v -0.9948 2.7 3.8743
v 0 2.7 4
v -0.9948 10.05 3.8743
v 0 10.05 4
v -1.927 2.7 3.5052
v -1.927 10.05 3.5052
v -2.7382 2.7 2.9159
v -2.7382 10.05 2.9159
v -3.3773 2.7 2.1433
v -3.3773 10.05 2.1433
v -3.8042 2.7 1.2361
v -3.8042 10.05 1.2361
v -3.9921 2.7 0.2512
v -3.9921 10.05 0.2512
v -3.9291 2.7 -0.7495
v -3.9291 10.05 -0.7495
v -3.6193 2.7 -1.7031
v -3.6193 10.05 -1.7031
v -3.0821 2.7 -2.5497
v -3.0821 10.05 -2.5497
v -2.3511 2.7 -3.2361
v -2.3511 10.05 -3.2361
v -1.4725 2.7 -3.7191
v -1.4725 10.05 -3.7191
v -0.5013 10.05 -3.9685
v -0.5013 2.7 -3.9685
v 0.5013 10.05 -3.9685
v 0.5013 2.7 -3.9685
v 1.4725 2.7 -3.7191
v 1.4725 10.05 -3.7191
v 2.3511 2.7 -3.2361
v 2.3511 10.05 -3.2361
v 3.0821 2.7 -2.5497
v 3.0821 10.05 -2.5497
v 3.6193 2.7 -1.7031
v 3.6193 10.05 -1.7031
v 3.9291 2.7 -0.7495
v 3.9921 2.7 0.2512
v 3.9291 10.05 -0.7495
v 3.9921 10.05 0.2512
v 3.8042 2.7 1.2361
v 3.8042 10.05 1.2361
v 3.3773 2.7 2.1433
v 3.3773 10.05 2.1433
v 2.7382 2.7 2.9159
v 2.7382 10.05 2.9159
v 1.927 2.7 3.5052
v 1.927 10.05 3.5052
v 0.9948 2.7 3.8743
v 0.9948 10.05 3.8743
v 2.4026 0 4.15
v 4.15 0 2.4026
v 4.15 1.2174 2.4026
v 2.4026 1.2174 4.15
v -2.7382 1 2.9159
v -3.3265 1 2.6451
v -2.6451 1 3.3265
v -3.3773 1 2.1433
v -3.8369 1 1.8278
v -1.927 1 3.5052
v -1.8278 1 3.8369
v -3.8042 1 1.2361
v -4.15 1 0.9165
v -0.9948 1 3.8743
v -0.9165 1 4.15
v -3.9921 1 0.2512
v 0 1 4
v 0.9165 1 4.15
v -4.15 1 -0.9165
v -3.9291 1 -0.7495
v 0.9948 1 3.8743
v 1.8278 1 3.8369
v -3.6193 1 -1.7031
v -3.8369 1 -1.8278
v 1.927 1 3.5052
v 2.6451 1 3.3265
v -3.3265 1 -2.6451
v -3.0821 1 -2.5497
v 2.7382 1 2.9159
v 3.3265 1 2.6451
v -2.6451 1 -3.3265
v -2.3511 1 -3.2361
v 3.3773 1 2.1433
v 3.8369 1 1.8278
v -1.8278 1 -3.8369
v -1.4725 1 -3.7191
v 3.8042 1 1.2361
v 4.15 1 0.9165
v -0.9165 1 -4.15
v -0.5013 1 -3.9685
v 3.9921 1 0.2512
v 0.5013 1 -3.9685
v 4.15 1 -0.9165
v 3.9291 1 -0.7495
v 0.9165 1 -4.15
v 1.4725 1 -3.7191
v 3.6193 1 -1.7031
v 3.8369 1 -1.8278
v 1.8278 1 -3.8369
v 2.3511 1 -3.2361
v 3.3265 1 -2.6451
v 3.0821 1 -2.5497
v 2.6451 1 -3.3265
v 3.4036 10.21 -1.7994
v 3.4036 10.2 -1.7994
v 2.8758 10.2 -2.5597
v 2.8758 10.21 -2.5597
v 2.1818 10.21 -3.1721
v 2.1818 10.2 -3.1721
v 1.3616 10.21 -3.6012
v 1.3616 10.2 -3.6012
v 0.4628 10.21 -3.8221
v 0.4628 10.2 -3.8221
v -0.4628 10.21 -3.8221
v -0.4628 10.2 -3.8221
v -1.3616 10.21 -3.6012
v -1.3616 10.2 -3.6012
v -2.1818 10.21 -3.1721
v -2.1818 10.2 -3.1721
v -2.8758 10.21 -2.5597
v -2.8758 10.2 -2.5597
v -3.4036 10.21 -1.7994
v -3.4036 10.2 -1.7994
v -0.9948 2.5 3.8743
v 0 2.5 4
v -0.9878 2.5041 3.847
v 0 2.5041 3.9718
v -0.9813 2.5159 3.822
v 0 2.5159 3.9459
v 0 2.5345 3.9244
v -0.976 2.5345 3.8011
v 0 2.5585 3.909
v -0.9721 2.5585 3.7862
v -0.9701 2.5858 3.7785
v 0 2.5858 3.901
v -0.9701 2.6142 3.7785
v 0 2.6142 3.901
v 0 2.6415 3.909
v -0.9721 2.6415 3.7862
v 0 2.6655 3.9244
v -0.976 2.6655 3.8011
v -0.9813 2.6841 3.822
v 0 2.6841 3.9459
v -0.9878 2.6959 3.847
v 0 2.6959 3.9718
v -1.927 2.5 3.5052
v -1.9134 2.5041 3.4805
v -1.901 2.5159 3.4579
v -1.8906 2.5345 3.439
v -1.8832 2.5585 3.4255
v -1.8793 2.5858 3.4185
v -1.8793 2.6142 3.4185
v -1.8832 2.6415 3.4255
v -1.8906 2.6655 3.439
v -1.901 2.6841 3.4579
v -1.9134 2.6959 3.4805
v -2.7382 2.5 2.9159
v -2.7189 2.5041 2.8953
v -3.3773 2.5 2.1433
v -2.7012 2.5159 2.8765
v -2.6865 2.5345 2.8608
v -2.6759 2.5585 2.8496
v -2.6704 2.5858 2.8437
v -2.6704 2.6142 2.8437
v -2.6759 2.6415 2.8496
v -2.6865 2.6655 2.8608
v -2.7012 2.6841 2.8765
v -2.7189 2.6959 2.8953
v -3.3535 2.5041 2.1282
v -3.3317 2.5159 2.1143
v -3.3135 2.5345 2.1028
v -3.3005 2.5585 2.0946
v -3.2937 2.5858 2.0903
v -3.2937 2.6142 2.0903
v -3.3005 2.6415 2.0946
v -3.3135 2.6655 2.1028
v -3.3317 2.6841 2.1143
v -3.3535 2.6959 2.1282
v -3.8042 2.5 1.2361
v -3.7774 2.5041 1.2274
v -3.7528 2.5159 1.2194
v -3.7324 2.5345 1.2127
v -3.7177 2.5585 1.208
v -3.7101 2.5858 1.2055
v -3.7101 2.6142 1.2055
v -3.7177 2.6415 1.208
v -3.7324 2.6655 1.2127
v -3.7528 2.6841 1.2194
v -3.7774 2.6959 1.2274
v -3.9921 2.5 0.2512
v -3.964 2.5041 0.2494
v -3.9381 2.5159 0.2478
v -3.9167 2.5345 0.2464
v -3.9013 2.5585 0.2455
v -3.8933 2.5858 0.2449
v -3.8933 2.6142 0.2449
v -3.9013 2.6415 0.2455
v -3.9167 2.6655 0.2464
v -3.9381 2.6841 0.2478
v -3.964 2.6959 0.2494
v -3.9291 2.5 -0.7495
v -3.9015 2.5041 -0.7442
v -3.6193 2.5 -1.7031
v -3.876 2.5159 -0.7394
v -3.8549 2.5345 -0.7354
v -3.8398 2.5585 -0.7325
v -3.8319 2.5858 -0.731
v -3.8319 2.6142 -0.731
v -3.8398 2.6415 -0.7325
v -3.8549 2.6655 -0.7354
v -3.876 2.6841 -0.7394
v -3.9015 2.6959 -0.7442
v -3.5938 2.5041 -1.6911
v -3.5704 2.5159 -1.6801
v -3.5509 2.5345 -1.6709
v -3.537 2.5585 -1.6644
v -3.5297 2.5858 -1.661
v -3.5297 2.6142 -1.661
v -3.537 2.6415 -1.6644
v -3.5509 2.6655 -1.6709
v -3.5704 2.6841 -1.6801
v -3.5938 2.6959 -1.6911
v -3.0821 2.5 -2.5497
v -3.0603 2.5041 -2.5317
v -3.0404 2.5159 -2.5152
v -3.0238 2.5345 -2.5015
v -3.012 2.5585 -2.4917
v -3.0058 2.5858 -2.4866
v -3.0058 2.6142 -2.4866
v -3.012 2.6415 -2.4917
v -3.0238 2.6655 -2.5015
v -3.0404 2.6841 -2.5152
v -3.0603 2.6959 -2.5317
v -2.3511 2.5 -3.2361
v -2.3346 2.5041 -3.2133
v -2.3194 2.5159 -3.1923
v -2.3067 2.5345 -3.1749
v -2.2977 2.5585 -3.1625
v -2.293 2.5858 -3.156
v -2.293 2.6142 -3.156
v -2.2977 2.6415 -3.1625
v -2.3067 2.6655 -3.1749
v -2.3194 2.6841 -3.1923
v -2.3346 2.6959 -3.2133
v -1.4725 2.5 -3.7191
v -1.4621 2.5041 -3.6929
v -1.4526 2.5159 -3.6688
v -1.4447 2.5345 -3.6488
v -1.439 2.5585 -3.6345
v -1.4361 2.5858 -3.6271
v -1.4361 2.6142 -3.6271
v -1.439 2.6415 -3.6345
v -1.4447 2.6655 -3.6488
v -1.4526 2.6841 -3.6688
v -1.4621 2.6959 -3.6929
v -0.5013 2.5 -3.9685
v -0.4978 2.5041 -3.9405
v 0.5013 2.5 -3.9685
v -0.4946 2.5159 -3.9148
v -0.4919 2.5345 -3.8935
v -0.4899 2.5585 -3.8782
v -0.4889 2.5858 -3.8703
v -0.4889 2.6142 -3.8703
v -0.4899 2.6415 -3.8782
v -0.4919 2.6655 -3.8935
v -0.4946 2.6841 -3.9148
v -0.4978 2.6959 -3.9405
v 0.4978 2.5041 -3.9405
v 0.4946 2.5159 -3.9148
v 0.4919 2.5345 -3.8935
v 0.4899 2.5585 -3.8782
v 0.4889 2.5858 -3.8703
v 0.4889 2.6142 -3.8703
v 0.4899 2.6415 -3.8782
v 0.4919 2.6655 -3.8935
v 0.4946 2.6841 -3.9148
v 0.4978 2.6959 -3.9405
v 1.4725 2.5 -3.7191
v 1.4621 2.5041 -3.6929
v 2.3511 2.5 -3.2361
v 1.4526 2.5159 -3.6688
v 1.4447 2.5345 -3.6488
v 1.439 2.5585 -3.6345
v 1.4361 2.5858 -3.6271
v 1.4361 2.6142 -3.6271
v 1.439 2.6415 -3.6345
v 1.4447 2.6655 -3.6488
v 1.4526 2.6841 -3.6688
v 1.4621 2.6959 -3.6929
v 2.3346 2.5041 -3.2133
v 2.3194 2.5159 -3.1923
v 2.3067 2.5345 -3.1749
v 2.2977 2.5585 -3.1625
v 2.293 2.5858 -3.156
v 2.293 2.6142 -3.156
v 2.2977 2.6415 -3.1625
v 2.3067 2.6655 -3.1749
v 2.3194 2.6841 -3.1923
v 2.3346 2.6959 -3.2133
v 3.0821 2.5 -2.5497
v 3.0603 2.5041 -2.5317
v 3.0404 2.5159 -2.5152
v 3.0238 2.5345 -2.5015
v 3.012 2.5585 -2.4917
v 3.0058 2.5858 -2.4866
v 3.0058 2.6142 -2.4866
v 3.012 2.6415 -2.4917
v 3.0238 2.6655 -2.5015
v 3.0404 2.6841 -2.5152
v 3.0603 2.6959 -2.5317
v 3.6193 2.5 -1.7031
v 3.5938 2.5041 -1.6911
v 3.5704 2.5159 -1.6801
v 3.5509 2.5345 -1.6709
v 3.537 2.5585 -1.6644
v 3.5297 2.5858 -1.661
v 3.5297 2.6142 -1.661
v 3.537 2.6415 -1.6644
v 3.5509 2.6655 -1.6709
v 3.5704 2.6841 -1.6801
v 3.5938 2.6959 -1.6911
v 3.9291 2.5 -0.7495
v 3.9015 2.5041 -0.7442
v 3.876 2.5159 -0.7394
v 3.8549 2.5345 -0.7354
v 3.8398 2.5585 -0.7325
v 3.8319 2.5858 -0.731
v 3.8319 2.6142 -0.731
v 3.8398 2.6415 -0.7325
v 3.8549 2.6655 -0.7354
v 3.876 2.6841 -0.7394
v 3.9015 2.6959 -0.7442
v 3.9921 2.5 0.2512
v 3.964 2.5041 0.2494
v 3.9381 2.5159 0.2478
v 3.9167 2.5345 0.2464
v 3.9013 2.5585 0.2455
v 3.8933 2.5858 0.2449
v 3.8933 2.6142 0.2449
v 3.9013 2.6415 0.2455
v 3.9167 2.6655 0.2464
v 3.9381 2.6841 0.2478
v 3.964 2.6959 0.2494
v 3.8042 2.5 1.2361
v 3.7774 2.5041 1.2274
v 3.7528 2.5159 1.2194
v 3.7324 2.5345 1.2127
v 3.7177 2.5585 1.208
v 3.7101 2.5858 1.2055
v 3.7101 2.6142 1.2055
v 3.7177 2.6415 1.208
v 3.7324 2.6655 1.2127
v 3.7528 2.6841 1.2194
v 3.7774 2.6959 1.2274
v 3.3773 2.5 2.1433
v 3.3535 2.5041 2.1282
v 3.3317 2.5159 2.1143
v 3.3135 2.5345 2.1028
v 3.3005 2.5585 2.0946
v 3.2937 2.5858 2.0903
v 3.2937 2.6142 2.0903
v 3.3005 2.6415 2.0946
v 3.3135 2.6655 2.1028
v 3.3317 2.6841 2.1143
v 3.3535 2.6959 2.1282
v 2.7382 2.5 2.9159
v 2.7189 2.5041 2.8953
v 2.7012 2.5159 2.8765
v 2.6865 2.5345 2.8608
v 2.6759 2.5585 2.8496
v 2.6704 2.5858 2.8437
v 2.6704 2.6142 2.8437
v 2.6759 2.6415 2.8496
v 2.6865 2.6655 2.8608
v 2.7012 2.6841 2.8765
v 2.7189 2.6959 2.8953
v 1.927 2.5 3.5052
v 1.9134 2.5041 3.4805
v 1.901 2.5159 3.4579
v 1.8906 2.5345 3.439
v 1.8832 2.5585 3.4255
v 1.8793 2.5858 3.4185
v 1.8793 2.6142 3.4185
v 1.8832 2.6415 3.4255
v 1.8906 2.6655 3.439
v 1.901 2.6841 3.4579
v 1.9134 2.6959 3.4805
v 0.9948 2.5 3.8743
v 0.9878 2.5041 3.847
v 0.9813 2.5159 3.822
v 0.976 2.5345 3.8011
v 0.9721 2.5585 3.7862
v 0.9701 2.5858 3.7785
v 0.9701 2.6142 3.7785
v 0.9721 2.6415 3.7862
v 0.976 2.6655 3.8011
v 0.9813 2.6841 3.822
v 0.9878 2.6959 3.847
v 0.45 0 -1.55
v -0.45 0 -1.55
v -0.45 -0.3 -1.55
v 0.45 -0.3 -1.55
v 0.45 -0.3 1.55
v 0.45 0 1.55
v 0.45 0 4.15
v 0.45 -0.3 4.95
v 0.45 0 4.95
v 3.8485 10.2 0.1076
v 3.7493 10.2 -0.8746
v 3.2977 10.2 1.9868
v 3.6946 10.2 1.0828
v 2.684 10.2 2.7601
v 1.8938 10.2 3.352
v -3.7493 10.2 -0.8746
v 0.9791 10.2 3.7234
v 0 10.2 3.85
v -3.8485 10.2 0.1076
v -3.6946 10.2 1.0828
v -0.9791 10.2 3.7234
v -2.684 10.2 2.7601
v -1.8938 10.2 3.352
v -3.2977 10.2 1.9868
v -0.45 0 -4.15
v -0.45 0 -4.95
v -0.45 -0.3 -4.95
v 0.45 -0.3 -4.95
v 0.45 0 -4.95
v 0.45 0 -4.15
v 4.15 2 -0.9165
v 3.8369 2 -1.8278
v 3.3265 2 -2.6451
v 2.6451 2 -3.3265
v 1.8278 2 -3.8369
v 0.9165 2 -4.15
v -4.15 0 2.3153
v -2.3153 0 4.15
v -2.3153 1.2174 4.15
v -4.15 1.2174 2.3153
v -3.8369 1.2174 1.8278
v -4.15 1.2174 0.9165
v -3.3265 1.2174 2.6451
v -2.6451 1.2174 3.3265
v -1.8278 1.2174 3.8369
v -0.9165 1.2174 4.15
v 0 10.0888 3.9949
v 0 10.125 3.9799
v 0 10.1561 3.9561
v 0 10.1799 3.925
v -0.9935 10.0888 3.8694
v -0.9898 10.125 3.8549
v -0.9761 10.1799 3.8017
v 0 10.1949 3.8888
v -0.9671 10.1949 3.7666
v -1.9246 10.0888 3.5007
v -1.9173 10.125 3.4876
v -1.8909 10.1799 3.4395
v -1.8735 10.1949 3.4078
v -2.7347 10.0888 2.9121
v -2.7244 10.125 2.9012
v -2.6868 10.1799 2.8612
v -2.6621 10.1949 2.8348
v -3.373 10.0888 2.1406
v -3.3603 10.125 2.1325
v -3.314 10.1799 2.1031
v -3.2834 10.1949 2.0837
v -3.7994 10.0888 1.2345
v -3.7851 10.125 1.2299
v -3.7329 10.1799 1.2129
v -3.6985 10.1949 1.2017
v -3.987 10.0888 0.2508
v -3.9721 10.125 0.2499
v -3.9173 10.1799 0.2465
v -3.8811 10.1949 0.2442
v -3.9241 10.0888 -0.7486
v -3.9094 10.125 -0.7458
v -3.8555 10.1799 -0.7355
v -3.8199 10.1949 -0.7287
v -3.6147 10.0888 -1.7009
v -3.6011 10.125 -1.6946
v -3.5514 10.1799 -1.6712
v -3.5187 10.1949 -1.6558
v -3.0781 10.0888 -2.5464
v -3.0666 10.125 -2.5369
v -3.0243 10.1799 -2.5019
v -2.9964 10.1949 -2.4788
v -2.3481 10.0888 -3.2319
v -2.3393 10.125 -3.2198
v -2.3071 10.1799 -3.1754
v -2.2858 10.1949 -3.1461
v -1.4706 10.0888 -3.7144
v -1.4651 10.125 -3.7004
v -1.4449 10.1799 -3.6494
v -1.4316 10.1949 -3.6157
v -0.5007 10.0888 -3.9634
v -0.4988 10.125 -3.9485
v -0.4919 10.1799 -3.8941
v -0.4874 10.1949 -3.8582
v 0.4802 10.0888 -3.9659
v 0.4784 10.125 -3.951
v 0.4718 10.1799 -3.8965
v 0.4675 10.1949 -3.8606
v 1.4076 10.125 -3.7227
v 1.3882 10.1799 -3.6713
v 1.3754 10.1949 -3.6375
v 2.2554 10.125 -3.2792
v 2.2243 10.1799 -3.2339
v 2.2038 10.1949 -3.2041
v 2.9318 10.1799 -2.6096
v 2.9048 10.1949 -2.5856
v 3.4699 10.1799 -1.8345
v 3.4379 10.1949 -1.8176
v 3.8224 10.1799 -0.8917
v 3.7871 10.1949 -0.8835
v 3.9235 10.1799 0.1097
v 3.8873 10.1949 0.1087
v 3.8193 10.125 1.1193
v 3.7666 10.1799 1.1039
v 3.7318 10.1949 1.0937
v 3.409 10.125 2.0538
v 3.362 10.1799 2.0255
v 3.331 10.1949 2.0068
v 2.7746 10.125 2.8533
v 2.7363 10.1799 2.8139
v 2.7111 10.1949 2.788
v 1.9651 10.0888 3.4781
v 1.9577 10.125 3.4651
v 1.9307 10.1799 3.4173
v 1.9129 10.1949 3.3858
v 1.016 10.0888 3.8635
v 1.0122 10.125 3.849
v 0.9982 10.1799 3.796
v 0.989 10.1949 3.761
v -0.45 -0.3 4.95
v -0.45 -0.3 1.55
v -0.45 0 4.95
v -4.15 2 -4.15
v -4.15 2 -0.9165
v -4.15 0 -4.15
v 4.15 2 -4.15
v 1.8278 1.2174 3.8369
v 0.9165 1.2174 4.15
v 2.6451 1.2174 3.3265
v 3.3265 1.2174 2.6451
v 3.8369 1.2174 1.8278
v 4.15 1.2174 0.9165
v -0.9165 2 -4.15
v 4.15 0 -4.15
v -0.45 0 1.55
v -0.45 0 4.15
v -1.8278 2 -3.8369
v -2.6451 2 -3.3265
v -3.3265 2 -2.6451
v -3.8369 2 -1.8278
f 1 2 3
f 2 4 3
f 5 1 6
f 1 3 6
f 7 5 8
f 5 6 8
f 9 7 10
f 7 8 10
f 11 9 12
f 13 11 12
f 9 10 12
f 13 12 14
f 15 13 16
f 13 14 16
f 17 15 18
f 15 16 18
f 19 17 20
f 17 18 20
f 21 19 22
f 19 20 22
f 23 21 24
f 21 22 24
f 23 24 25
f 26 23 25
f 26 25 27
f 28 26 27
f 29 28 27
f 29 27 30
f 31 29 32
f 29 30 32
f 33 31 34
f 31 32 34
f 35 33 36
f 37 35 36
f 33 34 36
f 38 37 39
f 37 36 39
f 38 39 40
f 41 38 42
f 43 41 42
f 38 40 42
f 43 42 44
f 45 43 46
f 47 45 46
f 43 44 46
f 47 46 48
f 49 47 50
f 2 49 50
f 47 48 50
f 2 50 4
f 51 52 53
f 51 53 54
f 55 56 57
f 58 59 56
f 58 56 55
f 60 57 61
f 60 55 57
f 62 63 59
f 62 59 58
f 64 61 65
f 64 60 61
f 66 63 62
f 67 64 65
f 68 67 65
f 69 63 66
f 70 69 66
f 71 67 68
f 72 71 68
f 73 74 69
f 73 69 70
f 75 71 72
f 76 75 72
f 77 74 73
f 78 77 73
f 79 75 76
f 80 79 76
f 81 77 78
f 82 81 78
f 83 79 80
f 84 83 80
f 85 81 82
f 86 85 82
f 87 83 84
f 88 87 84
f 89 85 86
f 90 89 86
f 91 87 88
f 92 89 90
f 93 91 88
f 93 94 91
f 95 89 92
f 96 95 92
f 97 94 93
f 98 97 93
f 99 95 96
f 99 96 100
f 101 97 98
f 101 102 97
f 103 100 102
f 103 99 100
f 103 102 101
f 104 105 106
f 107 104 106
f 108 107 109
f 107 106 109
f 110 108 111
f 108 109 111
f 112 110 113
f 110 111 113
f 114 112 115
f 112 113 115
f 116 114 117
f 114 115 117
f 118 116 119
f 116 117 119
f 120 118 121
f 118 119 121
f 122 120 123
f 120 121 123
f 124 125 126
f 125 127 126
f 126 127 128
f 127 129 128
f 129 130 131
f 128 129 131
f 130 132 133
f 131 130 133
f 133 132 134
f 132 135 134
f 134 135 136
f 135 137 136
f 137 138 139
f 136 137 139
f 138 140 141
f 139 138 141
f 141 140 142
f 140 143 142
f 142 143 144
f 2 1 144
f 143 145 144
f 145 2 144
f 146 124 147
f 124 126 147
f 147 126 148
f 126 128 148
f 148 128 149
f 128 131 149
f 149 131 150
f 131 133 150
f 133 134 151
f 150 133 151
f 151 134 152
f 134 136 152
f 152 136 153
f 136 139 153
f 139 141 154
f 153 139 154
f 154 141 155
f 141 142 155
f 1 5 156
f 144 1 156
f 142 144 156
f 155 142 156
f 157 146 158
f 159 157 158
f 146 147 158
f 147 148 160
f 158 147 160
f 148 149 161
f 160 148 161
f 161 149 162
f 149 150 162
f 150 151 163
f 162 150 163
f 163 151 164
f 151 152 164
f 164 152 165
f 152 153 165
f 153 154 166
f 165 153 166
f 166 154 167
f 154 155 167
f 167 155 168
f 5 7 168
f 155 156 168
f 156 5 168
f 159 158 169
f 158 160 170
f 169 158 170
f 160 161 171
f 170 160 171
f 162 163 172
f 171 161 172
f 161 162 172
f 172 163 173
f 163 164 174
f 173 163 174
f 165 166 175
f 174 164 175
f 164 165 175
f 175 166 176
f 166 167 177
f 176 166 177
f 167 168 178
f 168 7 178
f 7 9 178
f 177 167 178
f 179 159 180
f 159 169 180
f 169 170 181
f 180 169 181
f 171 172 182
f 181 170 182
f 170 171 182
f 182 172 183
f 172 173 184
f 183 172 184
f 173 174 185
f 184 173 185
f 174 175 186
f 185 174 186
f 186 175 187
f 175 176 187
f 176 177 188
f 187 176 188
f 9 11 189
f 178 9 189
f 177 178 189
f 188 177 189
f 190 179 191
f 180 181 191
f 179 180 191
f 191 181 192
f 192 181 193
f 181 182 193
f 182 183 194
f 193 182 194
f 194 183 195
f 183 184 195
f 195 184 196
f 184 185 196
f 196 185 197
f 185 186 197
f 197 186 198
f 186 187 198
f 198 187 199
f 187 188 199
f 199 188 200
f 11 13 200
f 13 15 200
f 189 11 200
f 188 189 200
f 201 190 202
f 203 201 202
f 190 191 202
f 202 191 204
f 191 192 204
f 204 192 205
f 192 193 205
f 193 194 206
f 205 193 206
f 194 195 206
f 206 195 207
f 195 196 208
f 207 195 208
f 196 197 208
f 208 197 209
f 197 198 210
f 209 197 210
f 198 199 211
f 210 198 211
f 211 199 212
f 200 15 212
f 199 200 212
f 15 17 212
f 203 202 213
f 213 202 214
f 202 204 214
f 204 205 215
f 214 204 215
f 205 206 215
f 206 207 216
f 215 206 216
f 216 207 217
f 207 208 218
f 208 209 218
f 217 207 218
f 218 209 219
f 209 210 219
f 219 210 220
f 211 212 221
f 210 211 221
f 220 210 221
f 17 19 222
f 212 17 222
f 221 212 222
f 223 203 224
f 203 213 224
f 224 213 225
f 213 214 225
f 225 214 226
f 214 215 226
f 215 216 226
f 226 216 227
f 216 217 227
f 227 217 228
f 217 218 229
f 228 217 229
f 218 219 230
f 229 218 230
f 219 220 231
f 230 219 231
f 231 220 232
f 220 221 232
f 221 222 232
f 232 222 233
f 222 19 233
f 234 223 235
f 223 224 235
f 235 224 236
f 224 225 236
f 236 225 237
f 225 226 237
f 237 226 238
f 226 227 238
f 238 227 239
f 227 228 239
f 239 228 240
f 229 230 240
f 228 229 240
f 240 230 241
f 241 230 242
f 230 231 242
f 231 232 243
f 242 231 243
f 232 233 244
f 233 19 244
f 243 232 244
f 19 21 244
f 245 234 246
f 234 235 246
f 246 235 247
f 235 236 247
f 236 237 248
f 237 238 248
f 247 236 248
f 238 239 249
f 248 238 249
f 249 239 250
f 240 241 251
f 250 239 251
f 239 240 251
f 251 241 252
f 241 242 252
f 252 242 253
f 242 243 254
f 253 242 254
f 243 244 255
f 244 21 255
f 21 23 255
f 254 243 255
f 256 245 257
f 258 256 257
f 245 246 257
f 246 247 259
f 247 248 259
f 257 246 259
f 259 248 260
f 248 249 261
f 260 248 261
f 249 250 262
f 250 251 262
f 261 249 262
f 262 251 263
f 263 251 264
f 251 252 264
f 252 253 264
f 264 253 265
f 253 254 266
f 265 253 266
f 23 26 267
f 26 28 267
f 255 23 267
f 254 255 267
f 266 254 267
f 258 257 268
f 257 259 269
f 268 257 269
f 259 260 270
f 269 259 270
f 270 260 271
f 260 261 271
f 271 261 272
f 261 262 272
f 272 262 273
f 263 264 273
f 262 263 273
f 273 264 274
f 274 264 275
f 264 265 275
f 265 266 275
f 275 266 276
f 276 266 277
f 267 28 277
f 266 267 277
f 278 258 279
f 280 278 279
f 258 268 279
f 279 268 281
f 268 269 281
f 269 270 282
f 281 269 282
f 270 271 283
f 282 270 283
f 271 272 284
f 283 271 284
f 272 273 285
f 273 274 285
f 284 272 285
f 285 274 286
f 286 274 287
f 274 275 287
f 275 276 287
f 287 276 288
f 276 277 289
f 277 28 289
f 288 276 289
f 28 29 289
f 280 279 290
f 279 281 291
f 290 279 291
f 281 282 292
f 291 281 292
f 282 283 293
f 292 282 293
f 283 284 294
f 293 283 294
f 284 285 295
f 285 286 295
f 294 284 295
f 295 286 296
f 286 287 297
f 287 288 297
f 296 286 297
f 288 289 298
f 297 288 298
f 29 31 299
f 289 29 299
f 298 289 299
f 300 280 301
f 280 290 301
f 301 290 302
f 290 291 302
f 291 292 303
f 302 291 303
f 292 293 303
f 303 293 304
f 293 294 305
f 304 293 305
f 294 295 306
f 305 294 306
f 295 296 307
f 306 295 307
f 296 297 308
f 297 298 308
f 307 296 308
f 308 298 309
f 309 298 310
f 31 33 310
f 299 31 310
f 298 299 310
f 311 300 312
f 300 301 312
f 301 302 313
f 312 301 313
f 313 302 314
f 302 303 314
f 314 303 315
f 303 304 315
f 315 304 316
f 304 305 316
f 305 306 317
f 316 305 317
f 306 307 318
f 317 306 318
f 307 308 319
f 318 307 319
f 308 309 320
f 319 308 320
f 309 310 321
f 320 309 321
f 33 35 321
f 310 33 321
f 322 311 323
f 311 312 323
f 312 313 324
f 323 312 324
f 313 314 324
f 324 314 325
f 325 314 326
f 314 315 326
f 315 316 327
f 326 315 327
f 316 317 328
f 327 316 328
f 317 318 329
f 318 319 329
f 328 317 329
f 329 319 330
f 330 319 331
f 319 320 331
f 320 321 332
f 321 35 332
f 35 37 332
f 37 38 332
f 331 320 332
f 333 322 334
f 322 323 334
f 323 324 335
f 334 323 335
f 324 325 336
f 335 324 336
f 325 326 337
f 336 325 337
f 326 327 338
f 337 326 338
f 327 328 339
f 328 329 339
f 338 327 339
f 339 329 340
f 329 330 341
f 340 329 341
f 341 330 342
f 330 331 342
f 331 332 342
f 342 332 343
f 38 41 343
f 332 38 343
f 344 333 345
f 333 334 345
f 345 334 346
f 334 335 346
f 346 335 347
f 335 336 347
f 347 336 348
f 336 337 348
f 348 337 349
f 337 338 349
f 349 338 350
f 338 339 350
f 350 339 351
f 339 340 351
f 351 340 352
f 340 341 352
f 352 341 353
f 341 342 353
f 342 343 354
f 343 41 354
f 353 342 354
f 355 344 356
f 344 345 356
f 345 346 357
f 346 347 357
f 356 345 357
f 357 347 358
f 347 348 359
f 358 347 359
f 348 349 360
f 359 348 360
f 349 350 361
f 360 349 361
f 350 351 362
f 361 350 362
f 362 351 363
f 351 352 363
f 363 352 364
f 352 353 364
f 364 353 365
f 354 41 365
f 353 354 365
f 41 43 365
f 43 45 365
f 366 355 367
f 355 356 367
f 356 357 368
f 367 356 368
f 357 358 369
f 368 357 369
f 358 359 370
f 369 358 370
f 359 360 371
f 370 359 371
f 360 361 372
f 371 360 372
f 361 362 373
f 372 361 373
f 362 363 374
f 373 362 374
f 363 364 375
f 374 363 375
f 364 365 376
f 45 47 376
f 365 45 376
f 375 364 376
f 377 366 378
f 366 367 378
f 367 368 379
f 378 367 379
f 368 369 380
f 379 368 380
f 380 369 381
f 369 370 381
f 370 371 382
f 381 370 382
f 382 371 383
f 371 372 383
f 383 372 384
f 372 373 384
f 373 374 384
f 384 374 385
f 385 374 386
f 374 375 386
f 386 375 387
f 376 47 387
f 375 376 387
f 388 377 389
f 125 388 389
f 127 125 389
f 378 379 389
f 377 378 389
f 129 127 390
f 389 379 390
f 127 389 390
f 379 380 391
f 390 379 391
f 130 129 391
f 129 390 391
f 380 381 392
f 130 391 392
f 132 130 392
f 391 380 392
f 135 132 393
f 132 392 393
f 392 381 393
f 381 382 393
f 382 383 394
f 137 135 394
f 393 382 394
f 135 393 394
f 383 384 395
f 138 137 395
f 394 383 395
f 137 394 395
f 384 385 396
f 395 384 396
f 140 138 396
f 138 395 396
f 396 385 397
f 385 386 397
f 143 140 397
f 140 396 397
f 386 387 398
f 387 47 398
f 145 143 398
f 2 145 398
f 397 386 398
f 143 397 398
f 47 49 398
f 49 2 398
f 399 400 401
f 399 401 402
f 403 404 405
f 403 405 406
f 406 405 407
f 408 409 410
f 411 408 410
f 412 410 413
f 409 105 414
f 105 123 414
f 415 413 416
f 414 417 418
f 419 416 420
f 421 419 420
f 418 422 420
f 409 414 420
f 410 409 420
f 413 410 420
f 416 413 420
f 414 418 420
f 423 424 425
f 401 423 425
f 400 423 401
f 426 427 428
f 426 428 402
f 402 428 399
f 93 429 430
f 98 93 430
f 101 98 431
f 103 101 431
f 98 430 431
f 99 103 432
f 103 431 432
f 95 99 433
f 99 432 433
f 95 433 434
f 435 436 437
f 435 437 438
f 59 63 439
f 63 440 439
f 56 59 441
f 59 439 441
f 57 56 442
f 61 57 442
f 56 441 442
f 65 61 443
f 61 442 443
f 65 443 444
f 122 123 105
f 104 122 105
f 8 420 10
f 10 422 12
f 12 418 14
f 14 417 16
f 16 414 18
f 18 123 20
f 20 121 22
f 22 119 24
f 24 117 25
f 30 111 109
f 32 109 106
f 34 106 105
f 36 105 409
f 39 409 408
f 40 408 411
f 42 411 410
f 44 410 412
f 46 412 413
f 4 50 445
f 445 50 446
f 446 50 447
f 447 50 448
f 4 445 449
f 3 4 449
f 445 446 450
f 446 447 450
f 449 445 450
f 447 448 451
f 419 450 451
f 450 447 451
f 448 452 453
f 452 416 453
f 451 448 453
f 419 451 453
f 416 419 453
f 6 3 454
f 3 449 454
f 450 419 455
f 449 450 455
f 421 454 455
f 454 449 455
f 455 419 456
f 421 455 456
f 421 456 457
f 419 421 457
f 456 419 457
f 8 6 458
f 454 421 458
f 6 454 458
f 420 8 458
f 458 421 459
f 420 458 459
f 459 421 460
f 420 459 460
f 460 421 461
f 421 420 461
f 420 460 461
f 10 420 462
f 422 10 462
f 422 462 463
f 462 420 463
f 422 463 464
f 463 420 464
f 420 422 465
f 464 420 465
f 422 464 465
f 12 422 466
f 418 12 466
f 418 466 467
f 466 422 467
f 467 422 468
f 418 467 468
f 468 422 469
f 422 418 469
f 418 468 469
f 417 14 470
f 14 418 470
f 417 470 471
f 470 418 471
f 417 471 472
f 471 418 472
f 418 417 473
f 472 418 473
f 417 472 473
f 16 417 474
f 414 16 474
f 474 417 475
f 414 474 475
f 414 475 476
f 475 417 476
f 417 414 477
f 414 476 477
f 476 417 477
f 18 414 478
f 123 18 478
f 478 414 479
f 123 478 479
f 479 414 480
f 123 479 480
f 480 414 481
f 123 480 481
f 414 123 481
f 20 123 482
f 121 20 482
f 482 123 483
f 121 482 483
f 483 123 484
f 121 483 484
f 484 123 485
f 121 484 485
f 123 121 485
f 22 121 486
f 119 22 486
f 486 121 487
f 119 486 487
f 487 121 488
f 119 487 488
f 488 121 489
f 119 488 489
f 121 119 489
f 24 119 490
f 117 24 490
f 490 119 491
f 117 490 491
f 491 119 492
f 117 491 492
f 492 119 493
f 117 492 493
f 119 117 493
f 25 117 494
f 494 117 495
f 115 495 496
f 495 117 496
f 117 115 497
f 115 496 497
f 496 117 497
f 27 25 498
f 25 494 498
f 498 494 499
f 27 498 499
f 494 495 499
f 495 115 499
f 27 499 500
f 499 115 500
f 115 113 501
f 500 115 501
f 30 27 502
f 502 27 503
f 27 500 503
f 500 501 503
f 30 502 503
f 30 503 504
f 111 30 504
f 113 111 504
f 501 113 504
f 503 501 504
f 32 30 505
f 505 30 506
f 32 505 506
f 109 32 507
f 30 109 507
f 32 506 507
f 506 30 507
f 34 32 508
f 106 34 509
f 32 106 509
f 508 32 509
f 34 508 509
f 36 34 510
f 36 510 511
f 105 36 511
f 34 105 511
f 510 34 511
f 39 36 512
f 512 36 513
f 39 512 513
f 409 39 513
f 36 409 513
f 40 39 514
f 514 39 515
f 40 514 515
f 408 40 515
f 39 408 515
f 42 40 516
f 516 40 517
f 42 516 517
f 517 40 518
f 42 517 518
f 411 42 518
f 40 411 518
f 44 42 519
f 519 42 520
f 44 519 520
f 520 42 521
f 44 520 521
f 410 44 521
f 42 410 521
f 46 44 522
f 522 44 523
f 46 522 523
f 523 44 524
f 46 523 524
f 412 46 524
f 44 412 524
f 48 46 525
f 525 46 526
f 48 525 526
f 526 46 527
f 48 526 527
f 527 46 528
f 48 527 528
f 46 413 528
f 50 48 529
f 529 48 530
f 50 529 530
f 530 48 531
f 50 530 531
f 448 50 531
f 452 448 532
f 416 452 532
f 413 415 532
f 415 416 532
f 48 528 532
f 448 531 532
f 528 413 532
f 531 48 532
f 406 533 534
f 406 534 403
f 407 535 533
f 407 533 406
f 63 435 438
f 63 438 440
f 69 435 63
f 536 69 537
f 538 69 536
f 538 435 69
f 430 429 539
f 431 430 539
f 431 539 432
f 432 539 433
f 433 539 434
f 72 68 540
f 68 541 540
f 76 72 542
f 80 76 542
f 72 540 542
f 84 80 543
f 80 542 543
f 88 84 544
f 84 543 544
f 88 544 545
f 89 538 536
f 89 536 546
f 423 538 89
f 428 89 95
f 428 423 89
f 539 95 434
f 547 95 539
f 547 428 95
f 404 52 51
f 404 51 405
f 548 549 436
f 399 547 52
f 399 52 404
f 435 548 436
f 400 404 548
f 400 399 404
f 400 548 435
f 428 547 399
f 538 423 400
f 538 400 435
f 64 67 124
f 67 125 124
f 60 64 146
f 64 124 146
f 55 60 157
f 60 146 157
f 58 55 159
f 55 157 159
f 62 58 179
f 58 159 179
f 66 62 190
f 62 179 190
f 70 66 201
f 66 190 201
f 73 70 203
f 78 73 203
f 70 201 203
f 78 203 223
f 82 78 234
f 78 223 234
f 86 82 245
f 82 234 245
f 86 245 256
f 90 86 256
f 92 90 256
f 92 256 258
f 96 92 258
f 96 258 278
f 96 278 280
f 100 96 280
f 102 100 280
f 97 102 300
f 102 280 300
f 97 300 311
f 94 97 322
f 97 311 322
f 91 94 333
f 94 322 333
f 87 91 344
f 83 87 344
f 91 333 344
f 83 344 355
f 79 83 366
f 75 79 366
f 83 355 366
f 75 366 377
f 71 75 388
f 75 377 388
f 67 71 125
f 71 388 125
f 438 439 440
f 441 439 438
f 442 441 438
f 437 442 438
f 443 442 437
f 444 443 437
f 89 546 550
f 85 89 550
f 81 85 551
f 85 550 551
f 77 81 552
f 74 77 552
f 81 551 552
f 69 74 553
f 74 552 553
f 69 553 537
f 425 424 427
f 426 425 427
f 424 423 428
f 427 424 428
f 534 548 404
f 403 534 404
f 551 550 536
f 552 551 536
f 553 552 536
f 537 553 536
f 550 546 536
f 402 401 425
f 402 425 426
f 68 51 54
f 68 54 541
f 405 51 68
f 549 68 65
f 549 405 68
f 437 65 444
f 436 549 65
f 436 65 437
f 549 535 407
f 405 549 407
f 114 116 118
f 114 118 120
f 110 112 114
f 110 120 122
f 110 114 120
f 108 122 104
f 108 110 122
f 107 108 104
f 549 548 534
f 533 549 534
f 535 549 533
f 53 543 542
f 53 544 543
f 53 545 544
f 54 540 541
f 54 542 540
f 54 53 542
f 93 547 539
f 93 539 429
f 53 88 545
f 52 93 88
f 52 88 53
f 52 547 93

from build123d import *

# Parameters (mm, degrees)
BOSS_EXTRUDE1_DEPTH = 2
SKETCH2_R           = 4.25
CUT_EXTRUDE1_DEPTH  = 1
CUT_EXTRUDE4_START  = -8.3
SKETCH8_W           = 3.410115148
SKETCH8_H           = 1.095606144
CUT_EXTRUDE4_DEPTH  = 8.3
BOSS_EXTRUDE4_DEPTH = 0.01
SKETCH9_W           = 0.9
SKETCH9_H           = 3.4
BOSS_EXTRUDE5_DEPTH = 0.3


with BuildPart() as part:
    # Sketch1 → Boss-Extrude1 (new body)
    with BuildSketch(Plane(origin=(0, 0, 0), x_dir=(1, 0, 0), z_dir=(0, 1, 0))):
        Polygon((-4.15, 4.15), (4.15, 4.15), (4.15, -2.402631579), (2.402631579, -4.15), (-2.315263158, -4.15), (-4.15, -2.315263158), align=None)
    extrude(amount=BOSS_EXTRUDE1_DEPTH)

    # Sketch2 → Cut-Extrude1 (cut)
    with BuildSketch(Plane(origin=(0, 2, 0), x_dir=(1, 0, 0), z_dir=(0, 1, 0))):
        Circle(SKETCH2_R)
    extrude(amount=-CUT_EXTRUDE1_DEPTH, mode=Mode.SUBTRACT)

    # Sketch8 → Cut-Extrude4 (cut)
    with BuildSketch(Plane.ZY.offset(4.15).offset(CUT_EXTRUDE4_START)):
        with Locations((2.621572713, 1.765165498)):
            Rectangle(SKETCH8_W, SKETCH8_H)
    extrude(amount=CUT_EXTRUDE4_DEPTH, mode=Mode.SUBTRACT)

    # Sketch5 → Revolve1 (revolve)
    with BuildSketch(Plane.XY, mode=Mode.PRIVATE) as revolve1_sk:
        with BuildLine():
            Line((0, 1), (-4, 1))
            Line((-4, 1), (-4, 2.5))
            ThreePointArc((-4, 2.5), (-3.9, 2.6), (-4, 2.7))
            Line((-4, 2.7), (-4, 10.05))
            ThreePointArc((-4, 10.05), (-3.956066017, 10.156066017), (-3.85, 10.2))
            Line((-3.85, 10.2), (0, 10.2))
            Line((0, 10.2), (0, 1))
        make_face()
    revolve(revolve1_sk.sketch.rotate(Axis((0, 10.2, 0), (0, -1, 0)), 270), axis=Axis((0, 10.2, 0), (0, -1, 0)))

    # Sketch6 → Boss-Extrude4 (add)
    with BuildSketch(Plane(origin=(0, 10.2, 0), x_dir=(1, 0, 0), z_dir=(0, 1, 0))):
        with BuildLine():
            Line((-3.403621507, 1.799405635), (3.403621507, 1.799405635))
            ThreePointArc((3.403621507, 1.799405635), (0, 3.85), (-3.403621507, 1.799405635))
        make_face()
    extrude(amount=BOSS_EXTRUDE4_DEPTH)

    # Sketch9 → Boss-Extrude5 (add)
    with BuildSketch(Plane.XZ):
        with Locations((0, -3.25)):
            Rectangle(SKETCH9_W, SKETCH9_H)
        with Locations((0, 3.25)):
            Rectangle(SKETCH9_W, SKETCH9_H)
    extrude(amount=BOSS_EXTRUDE5_DEPTH)


solid = part.part
